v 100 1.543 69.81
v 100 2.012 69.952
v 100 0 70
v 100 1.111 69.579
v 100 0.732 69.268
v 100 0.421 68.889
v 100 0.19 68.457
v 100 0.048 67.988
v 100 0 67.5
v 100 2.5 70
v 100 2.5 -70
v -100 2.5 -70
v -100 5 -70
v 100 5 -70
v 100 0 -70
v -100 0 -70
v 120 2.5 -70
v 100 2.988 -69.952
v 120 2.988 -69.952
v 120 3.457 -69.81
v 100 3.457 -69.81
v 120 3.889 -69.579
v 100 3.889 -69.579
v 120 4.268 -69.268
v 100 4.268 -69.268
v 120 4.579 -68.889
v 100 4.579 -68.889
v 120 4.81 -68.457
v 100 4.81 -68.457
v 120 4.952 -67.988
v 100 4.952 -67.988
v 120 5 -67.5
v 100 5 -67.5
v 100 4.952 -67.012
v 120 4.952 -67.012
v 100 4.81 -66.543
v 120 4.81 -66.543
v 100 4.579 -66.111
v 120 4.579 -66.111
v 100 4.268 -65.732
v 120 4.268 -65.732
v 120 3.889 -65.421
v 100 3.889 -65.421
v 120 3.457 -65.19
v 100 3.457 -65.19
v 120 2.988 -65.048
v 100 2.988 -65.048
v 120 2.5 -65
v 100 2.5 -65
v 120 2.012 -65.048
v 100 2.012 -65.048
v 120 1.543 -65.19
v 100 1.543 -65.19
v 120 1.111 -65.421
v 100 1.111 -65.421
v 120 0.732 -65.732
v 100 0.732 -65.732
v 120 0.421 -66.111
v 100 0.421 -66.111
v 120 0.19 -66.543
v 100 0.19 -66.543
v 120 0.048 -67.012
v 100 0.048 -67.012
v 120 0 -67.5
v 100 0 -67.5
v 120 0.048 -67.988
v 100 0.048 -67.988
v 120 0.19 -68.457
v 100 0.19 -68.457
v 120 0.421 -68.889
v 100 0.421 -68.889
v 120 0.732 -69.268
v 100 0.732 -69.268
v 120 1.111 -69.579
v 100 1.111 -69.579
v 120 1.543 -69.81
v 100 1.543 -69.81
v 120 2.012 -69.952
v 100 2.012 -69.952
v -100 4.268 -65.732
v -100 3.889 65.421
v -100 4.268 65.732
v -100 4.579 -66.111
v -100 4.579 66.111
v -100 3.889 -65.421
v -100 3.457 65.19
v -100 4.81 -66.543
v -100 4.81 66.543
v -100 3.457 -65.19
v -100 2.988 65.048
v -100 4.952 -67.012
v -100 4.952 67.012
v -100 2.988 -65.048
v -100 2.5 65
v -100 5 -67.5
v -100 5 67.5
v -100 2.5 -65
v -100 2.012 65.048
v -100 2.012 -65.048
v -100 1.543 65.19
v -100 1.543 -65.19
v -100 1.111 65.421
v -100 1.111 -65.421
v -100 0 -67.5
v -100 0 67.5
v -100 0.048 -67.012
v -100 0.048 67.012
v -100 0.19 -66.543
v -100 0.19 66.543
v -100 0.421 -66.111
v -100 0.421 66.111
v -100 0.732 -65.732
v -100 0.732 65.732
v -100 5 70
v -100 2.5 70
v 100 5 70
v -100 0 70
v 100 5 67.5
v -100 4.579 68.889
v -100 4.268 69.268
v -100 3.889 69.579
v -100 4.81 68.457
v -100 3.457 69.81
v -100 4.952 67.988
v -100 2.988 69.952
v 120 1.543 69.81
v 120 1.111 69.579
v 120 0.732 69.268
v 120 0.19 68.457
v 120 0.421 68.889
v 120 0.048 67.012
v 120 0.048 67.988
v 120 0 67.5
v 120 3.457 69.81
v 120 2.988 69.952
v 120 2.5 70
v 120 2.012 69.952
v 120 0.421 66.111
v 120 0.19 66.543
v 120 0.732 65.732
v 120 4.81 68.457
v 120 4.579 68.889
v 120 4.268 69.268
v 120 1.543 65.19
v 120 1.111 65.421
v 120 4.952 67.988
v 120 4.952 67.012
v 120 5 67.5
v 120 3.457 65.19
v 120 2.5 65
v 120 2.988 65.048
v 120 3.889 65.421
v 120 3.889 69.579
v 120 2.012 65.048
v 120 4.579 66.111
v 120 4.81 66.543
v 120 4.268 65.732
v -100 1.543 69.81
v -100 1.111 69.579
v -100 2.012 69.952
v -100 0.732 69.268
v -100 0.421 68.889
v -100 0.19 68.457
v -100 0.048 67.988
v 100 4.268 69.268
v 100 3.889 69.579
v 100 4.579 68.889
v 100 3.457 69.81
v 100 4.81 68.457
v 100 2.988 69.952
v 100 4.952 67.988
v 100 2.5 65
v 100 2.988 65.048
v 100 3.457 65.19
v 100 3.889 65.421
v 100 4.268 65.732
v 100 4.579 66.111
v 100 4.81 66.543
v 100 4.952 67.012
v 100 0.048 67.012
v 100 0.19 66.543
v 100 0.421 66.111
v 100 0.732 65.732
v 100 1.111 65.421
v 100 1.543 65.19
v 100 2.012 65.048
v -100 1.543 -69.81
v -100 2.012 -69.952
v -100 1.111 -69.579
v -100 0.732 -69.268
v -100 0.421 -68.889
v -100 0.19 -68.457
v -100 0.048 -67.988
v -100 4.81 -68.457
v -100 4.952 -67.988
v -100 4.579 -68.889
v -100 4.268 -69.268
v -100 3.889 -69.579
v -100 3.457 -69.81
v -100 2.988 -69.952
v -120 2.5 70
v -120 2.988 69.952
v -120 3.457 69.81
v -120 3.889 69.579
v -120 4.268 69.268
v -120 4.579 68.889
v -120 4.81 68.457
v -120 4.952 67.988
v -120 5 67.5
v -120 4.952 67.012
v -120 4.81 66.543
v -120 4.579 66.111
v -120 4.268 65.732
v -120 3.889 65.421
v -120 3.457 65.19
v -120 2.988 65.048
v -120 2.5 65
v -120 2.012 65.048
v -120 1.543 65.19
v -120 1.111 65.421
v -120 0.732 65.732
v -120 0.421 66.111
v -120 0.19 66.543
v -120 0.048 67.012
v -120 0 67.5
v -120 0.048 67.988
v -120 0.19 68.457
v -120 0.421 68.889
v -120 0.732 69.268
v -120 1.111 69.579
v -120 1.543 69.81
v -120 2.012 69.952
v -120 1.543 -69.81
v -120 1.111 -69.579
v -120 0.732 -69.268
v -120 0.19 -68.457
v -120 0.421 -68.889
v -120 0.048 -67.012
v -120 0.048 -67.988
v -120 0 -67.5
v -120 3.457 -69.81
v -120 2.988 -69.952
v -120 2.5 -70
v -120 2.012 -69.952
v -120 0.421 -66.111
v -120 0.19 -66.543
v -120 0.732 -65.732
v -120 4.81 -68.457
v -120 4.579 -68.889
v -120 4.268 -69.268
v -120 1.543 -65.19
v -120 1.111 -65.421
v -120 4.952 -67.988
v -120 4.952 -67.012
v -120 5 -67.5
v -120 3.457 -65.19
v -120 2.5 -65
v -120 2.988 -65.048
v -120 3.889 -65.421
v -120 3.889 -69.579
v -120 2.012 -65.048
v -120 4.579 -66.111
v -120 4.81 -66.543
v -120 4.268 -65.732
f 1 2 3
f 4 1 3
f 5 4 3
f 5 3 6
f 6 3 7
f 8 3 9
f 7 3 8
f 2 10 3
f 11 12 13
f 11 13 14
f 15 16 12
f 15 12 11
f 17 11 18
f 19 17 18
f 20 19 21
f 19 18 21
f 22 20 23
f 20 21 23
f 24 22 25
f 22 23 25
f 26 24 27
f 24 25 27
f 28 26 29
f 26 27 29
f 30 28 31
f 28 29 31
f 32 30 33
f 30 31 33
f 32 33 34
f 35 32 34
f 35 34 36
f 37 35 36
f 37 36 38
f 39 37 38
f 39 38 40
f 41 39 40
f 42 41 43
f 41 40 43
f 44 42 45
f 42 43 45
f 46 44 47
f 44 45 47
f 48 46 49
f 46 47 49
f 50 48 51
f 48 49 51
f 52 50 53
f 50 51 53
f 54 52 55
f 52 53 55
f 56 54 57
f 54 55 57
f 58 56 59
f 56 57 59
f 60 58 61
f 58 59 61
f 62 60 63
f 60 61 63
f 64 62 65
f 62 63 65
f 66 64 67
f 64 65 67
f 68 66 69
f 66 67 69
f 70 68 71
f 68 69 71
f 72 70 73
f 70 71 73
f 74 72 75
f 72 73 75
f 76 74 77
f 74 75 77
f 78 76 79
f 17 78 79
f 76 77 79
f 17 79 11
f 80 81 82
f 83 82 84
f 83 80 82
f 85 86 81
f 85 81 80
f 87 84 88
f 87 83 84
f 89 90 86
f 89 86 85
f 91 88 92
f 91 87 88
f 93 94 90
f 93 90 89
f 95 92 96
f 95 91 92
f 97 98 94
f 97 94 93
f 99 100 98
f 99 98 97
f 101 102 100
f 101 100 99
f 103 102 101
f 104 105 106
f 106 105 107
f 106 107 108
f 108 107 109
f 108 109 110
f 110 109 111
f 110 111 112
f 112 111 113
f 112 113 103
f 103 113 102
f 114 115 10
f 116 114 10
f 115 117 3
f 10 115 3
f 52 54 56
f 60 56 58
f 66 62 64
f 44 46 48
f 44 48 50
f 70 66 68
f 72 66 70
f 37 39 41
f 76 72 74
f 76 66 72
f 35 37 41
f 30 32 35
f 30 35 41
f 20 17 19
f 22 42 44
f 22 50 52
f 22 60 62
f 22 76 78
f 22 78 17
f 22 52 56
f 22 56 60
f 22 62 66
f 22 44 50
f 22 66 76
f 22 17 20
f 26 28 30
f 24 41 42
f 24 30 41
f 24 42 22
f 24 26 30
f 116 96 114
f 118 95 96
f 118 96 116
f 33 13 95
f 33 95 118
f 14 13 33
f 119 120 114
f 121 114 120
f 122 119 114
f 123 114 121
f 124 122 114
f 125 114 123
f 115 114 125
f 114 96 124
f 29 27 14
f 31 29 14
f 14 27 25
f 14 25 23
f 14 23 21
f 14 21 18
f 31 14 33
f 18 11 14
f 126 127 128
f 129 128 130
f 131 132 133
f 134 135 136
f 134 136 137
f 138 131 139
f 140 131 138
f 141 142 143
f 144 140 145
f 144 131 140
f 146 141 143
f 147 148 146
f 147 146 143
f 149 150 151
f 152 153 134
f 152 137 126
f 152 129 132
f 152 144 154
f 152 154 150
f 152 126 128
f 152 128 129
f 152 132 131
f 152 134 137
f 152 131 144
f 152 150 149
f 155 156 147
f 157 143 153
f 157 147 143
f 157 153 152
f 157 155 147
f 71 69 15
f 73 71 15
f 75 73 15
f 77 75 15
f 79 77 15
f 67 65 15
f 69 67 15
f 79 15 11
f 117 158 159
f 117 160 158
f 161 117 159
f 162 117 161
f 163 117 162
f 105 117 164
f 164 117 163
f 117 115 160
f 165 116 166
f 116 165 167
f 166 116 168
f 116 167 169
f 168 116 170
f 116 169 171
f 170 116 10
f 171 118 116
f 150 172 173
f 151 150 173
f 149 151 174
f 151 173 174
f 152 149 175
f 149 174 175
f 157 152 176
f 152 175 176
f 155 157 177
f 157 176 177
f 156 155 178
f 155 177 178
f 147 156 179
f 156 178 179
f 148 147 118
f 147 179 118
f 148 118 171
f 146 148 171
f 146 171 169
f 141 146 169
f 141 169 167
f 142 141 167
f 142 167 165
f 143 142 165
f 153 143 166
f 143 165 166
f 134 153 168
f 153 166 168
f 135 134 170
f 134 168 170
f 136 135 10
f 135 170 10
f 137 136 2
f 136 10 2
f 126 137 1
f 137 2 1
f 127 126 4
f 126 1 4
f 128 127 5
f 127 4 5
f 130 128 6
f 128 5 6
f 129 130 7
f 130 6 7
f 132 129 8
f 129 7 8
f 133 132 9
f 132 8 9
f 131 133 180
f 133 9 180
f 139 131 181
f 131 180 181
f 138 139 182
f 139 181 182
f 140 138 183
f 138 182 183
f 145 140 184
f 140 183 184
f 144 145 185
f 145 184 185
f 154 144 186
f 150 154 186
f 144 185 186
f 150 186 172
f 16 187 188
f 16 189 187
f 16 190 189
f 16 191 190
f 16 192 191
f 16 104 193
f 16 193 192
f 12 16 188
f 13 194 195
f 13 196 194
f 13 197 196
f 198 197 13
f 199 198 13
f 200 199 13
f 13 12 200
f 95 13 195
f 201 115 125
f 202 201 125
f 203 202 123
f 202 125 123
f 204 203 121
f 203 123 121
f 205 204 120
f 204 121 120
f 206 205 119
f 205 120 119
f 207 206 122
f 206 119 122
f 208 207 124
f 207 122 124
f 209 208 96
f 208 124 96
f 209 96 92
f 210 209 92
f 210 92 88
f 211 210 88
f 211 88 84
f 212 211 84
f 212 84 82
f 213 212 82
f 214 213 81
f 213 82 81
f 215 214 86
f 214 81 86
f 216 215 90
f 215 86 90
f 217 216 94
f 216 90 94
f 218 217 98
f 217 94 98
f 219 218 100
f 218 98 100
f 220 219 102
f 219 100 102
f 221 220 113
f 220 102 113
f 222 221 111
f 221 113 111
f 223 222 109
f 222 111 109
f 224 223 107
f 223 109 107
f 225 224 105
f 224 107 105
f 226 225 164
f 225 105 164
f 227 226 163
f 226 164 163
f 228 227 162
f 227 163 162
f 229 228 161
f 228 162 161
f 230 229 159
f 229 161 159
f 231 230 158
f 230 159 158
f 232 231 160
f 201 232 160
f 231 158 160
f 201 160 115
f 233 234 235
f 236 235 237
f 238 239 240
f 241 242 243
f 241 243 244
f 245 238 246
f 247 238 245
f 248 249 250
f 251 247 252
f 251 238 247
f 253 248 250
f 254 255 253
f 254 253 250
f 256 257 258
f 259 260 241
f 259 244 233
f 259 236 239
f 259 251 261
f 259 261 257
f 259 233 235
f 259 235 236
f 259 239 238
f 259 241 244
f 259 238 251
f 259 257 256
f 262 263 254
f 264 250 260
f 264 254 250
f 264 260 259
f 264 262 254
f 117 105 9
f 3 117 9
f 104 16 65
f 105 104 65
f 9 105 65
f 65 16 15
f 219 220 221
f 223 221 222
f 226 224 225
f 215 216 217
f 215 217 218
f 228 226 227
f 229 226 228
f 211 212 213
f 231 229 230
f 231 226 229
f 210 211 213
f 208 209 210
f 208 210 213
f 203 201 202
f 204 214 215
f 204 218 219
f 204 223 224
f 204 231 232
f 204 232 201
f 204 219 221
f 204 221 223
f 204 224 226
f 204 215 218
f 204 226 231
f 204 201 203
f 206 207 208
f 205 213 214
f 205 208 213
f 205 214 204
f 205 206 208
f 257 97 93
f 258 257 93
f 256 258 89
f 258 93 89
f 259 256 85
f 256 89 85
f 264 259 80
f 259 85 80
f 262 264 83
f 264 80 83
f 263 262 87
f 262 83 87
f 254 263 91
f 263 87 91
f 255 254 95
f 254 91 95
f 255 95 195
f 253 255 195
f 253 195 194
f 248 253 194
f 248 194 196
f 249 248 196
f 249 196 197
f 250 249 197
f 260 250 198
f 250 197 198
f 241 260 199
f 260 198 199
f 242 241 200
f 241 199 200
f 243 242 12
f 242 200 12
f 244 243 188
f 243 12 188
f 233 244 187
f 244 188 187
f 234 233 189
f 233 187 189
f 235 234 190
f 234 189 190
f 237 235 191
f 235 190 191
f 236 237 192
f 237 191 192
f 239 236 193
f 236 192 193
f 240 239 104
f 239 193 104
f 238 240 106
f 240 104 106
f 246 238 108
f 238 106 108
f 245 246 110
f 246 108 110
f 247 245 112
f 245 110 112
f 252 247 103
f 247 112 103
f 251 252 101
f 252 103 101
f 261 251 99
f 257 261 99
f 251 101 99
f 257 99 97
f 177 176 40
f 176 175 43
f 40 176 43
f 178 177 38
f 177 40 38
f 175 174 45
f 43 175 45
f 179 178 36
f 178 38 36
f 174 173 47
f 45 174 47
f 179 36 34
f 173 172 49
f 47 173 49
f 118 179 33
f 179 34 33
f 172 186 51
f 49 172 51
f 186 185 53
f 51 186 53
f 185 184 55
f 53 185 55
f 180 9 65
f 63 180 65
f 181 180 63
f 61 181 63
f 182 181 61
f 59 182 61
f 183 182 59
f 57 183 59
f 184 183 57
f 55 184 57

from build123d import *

# Parameters (mm, degrees)
ESQUISSE1_W        = 200
ESQUISSE1_H        = 140
BOSS_EXTRU_1_DEPTH = 5
ESQUISSE3_R        = 2.5
BOSS_EXTRU_2_DEPTH = 20
ESQUISSE4_R        = 2.5
BOSS_EXTRU_3_DEPTH = 20
ESQUISSE6_R        = 2.5
BOSS_EXTRU_4_DEPTH = 20
ESQUISSE8_R        = 2.5
BOSS_EXTRU_5_DEPTH = 20


with BuildPart() as part:
    # Esquisse1 → Boss.-Extru.1 (new body)
    with BuildSketch(Plane(origin=(0, 0, 0), x_dir=(1, 0, 0), z_dir=(0, 1, 0))):
        Rectangle(ESQUISSE1_W, ESQUISSE1_H)
    extrude(amount=BOSS_EXTRU_1_DEPTH)

    # Esquisse3 → Boss.-Extru.2 (add)
    with BuildSketch(Plane.ZY.offset(100)):
        with Locations((67.5, 2.5)):
            Circle(ESQUISSE3_R)
    extrude(amount=BOSS_EXTRU_2_DEPTH)

    # Esquisse4 → Boss.-Extru.3 (add)
    with BuildSketch(Plane(origin=(100, 0, 0), x_dir=(0, 0, -1), z_dir=(1, 0, 0))):
        with Locations((-67.5, 2.5)):
            Circle(ESQUISSE4_R)
    extrude(amount=BOSS_EXTRU_3_DEPTH)

    # Esquisse6 → Boss.-Extru.4 (add)
    with BuildSketch(Plane.ZY.offset(100)):
        with Locations((-67.5, 2.5)):
            Circle(ESQUISSE6_R)
    extrude(amount=BOSS_EXTRU_4_DEPTH)

    # Esquisse8 → Boss.-Extru.5 (add)
    with BuildSketch(Plane(origin=(100, 0, 0), x_dir=(0, 0, -1), z_dir=(1, 0, 0))):
        with Locations((67.5, 2.5)):
            Circle(ESQUISSE8_R)
    extrude(amount=BOSS_EXTRU_5_DEPTH)


solid = part.part
